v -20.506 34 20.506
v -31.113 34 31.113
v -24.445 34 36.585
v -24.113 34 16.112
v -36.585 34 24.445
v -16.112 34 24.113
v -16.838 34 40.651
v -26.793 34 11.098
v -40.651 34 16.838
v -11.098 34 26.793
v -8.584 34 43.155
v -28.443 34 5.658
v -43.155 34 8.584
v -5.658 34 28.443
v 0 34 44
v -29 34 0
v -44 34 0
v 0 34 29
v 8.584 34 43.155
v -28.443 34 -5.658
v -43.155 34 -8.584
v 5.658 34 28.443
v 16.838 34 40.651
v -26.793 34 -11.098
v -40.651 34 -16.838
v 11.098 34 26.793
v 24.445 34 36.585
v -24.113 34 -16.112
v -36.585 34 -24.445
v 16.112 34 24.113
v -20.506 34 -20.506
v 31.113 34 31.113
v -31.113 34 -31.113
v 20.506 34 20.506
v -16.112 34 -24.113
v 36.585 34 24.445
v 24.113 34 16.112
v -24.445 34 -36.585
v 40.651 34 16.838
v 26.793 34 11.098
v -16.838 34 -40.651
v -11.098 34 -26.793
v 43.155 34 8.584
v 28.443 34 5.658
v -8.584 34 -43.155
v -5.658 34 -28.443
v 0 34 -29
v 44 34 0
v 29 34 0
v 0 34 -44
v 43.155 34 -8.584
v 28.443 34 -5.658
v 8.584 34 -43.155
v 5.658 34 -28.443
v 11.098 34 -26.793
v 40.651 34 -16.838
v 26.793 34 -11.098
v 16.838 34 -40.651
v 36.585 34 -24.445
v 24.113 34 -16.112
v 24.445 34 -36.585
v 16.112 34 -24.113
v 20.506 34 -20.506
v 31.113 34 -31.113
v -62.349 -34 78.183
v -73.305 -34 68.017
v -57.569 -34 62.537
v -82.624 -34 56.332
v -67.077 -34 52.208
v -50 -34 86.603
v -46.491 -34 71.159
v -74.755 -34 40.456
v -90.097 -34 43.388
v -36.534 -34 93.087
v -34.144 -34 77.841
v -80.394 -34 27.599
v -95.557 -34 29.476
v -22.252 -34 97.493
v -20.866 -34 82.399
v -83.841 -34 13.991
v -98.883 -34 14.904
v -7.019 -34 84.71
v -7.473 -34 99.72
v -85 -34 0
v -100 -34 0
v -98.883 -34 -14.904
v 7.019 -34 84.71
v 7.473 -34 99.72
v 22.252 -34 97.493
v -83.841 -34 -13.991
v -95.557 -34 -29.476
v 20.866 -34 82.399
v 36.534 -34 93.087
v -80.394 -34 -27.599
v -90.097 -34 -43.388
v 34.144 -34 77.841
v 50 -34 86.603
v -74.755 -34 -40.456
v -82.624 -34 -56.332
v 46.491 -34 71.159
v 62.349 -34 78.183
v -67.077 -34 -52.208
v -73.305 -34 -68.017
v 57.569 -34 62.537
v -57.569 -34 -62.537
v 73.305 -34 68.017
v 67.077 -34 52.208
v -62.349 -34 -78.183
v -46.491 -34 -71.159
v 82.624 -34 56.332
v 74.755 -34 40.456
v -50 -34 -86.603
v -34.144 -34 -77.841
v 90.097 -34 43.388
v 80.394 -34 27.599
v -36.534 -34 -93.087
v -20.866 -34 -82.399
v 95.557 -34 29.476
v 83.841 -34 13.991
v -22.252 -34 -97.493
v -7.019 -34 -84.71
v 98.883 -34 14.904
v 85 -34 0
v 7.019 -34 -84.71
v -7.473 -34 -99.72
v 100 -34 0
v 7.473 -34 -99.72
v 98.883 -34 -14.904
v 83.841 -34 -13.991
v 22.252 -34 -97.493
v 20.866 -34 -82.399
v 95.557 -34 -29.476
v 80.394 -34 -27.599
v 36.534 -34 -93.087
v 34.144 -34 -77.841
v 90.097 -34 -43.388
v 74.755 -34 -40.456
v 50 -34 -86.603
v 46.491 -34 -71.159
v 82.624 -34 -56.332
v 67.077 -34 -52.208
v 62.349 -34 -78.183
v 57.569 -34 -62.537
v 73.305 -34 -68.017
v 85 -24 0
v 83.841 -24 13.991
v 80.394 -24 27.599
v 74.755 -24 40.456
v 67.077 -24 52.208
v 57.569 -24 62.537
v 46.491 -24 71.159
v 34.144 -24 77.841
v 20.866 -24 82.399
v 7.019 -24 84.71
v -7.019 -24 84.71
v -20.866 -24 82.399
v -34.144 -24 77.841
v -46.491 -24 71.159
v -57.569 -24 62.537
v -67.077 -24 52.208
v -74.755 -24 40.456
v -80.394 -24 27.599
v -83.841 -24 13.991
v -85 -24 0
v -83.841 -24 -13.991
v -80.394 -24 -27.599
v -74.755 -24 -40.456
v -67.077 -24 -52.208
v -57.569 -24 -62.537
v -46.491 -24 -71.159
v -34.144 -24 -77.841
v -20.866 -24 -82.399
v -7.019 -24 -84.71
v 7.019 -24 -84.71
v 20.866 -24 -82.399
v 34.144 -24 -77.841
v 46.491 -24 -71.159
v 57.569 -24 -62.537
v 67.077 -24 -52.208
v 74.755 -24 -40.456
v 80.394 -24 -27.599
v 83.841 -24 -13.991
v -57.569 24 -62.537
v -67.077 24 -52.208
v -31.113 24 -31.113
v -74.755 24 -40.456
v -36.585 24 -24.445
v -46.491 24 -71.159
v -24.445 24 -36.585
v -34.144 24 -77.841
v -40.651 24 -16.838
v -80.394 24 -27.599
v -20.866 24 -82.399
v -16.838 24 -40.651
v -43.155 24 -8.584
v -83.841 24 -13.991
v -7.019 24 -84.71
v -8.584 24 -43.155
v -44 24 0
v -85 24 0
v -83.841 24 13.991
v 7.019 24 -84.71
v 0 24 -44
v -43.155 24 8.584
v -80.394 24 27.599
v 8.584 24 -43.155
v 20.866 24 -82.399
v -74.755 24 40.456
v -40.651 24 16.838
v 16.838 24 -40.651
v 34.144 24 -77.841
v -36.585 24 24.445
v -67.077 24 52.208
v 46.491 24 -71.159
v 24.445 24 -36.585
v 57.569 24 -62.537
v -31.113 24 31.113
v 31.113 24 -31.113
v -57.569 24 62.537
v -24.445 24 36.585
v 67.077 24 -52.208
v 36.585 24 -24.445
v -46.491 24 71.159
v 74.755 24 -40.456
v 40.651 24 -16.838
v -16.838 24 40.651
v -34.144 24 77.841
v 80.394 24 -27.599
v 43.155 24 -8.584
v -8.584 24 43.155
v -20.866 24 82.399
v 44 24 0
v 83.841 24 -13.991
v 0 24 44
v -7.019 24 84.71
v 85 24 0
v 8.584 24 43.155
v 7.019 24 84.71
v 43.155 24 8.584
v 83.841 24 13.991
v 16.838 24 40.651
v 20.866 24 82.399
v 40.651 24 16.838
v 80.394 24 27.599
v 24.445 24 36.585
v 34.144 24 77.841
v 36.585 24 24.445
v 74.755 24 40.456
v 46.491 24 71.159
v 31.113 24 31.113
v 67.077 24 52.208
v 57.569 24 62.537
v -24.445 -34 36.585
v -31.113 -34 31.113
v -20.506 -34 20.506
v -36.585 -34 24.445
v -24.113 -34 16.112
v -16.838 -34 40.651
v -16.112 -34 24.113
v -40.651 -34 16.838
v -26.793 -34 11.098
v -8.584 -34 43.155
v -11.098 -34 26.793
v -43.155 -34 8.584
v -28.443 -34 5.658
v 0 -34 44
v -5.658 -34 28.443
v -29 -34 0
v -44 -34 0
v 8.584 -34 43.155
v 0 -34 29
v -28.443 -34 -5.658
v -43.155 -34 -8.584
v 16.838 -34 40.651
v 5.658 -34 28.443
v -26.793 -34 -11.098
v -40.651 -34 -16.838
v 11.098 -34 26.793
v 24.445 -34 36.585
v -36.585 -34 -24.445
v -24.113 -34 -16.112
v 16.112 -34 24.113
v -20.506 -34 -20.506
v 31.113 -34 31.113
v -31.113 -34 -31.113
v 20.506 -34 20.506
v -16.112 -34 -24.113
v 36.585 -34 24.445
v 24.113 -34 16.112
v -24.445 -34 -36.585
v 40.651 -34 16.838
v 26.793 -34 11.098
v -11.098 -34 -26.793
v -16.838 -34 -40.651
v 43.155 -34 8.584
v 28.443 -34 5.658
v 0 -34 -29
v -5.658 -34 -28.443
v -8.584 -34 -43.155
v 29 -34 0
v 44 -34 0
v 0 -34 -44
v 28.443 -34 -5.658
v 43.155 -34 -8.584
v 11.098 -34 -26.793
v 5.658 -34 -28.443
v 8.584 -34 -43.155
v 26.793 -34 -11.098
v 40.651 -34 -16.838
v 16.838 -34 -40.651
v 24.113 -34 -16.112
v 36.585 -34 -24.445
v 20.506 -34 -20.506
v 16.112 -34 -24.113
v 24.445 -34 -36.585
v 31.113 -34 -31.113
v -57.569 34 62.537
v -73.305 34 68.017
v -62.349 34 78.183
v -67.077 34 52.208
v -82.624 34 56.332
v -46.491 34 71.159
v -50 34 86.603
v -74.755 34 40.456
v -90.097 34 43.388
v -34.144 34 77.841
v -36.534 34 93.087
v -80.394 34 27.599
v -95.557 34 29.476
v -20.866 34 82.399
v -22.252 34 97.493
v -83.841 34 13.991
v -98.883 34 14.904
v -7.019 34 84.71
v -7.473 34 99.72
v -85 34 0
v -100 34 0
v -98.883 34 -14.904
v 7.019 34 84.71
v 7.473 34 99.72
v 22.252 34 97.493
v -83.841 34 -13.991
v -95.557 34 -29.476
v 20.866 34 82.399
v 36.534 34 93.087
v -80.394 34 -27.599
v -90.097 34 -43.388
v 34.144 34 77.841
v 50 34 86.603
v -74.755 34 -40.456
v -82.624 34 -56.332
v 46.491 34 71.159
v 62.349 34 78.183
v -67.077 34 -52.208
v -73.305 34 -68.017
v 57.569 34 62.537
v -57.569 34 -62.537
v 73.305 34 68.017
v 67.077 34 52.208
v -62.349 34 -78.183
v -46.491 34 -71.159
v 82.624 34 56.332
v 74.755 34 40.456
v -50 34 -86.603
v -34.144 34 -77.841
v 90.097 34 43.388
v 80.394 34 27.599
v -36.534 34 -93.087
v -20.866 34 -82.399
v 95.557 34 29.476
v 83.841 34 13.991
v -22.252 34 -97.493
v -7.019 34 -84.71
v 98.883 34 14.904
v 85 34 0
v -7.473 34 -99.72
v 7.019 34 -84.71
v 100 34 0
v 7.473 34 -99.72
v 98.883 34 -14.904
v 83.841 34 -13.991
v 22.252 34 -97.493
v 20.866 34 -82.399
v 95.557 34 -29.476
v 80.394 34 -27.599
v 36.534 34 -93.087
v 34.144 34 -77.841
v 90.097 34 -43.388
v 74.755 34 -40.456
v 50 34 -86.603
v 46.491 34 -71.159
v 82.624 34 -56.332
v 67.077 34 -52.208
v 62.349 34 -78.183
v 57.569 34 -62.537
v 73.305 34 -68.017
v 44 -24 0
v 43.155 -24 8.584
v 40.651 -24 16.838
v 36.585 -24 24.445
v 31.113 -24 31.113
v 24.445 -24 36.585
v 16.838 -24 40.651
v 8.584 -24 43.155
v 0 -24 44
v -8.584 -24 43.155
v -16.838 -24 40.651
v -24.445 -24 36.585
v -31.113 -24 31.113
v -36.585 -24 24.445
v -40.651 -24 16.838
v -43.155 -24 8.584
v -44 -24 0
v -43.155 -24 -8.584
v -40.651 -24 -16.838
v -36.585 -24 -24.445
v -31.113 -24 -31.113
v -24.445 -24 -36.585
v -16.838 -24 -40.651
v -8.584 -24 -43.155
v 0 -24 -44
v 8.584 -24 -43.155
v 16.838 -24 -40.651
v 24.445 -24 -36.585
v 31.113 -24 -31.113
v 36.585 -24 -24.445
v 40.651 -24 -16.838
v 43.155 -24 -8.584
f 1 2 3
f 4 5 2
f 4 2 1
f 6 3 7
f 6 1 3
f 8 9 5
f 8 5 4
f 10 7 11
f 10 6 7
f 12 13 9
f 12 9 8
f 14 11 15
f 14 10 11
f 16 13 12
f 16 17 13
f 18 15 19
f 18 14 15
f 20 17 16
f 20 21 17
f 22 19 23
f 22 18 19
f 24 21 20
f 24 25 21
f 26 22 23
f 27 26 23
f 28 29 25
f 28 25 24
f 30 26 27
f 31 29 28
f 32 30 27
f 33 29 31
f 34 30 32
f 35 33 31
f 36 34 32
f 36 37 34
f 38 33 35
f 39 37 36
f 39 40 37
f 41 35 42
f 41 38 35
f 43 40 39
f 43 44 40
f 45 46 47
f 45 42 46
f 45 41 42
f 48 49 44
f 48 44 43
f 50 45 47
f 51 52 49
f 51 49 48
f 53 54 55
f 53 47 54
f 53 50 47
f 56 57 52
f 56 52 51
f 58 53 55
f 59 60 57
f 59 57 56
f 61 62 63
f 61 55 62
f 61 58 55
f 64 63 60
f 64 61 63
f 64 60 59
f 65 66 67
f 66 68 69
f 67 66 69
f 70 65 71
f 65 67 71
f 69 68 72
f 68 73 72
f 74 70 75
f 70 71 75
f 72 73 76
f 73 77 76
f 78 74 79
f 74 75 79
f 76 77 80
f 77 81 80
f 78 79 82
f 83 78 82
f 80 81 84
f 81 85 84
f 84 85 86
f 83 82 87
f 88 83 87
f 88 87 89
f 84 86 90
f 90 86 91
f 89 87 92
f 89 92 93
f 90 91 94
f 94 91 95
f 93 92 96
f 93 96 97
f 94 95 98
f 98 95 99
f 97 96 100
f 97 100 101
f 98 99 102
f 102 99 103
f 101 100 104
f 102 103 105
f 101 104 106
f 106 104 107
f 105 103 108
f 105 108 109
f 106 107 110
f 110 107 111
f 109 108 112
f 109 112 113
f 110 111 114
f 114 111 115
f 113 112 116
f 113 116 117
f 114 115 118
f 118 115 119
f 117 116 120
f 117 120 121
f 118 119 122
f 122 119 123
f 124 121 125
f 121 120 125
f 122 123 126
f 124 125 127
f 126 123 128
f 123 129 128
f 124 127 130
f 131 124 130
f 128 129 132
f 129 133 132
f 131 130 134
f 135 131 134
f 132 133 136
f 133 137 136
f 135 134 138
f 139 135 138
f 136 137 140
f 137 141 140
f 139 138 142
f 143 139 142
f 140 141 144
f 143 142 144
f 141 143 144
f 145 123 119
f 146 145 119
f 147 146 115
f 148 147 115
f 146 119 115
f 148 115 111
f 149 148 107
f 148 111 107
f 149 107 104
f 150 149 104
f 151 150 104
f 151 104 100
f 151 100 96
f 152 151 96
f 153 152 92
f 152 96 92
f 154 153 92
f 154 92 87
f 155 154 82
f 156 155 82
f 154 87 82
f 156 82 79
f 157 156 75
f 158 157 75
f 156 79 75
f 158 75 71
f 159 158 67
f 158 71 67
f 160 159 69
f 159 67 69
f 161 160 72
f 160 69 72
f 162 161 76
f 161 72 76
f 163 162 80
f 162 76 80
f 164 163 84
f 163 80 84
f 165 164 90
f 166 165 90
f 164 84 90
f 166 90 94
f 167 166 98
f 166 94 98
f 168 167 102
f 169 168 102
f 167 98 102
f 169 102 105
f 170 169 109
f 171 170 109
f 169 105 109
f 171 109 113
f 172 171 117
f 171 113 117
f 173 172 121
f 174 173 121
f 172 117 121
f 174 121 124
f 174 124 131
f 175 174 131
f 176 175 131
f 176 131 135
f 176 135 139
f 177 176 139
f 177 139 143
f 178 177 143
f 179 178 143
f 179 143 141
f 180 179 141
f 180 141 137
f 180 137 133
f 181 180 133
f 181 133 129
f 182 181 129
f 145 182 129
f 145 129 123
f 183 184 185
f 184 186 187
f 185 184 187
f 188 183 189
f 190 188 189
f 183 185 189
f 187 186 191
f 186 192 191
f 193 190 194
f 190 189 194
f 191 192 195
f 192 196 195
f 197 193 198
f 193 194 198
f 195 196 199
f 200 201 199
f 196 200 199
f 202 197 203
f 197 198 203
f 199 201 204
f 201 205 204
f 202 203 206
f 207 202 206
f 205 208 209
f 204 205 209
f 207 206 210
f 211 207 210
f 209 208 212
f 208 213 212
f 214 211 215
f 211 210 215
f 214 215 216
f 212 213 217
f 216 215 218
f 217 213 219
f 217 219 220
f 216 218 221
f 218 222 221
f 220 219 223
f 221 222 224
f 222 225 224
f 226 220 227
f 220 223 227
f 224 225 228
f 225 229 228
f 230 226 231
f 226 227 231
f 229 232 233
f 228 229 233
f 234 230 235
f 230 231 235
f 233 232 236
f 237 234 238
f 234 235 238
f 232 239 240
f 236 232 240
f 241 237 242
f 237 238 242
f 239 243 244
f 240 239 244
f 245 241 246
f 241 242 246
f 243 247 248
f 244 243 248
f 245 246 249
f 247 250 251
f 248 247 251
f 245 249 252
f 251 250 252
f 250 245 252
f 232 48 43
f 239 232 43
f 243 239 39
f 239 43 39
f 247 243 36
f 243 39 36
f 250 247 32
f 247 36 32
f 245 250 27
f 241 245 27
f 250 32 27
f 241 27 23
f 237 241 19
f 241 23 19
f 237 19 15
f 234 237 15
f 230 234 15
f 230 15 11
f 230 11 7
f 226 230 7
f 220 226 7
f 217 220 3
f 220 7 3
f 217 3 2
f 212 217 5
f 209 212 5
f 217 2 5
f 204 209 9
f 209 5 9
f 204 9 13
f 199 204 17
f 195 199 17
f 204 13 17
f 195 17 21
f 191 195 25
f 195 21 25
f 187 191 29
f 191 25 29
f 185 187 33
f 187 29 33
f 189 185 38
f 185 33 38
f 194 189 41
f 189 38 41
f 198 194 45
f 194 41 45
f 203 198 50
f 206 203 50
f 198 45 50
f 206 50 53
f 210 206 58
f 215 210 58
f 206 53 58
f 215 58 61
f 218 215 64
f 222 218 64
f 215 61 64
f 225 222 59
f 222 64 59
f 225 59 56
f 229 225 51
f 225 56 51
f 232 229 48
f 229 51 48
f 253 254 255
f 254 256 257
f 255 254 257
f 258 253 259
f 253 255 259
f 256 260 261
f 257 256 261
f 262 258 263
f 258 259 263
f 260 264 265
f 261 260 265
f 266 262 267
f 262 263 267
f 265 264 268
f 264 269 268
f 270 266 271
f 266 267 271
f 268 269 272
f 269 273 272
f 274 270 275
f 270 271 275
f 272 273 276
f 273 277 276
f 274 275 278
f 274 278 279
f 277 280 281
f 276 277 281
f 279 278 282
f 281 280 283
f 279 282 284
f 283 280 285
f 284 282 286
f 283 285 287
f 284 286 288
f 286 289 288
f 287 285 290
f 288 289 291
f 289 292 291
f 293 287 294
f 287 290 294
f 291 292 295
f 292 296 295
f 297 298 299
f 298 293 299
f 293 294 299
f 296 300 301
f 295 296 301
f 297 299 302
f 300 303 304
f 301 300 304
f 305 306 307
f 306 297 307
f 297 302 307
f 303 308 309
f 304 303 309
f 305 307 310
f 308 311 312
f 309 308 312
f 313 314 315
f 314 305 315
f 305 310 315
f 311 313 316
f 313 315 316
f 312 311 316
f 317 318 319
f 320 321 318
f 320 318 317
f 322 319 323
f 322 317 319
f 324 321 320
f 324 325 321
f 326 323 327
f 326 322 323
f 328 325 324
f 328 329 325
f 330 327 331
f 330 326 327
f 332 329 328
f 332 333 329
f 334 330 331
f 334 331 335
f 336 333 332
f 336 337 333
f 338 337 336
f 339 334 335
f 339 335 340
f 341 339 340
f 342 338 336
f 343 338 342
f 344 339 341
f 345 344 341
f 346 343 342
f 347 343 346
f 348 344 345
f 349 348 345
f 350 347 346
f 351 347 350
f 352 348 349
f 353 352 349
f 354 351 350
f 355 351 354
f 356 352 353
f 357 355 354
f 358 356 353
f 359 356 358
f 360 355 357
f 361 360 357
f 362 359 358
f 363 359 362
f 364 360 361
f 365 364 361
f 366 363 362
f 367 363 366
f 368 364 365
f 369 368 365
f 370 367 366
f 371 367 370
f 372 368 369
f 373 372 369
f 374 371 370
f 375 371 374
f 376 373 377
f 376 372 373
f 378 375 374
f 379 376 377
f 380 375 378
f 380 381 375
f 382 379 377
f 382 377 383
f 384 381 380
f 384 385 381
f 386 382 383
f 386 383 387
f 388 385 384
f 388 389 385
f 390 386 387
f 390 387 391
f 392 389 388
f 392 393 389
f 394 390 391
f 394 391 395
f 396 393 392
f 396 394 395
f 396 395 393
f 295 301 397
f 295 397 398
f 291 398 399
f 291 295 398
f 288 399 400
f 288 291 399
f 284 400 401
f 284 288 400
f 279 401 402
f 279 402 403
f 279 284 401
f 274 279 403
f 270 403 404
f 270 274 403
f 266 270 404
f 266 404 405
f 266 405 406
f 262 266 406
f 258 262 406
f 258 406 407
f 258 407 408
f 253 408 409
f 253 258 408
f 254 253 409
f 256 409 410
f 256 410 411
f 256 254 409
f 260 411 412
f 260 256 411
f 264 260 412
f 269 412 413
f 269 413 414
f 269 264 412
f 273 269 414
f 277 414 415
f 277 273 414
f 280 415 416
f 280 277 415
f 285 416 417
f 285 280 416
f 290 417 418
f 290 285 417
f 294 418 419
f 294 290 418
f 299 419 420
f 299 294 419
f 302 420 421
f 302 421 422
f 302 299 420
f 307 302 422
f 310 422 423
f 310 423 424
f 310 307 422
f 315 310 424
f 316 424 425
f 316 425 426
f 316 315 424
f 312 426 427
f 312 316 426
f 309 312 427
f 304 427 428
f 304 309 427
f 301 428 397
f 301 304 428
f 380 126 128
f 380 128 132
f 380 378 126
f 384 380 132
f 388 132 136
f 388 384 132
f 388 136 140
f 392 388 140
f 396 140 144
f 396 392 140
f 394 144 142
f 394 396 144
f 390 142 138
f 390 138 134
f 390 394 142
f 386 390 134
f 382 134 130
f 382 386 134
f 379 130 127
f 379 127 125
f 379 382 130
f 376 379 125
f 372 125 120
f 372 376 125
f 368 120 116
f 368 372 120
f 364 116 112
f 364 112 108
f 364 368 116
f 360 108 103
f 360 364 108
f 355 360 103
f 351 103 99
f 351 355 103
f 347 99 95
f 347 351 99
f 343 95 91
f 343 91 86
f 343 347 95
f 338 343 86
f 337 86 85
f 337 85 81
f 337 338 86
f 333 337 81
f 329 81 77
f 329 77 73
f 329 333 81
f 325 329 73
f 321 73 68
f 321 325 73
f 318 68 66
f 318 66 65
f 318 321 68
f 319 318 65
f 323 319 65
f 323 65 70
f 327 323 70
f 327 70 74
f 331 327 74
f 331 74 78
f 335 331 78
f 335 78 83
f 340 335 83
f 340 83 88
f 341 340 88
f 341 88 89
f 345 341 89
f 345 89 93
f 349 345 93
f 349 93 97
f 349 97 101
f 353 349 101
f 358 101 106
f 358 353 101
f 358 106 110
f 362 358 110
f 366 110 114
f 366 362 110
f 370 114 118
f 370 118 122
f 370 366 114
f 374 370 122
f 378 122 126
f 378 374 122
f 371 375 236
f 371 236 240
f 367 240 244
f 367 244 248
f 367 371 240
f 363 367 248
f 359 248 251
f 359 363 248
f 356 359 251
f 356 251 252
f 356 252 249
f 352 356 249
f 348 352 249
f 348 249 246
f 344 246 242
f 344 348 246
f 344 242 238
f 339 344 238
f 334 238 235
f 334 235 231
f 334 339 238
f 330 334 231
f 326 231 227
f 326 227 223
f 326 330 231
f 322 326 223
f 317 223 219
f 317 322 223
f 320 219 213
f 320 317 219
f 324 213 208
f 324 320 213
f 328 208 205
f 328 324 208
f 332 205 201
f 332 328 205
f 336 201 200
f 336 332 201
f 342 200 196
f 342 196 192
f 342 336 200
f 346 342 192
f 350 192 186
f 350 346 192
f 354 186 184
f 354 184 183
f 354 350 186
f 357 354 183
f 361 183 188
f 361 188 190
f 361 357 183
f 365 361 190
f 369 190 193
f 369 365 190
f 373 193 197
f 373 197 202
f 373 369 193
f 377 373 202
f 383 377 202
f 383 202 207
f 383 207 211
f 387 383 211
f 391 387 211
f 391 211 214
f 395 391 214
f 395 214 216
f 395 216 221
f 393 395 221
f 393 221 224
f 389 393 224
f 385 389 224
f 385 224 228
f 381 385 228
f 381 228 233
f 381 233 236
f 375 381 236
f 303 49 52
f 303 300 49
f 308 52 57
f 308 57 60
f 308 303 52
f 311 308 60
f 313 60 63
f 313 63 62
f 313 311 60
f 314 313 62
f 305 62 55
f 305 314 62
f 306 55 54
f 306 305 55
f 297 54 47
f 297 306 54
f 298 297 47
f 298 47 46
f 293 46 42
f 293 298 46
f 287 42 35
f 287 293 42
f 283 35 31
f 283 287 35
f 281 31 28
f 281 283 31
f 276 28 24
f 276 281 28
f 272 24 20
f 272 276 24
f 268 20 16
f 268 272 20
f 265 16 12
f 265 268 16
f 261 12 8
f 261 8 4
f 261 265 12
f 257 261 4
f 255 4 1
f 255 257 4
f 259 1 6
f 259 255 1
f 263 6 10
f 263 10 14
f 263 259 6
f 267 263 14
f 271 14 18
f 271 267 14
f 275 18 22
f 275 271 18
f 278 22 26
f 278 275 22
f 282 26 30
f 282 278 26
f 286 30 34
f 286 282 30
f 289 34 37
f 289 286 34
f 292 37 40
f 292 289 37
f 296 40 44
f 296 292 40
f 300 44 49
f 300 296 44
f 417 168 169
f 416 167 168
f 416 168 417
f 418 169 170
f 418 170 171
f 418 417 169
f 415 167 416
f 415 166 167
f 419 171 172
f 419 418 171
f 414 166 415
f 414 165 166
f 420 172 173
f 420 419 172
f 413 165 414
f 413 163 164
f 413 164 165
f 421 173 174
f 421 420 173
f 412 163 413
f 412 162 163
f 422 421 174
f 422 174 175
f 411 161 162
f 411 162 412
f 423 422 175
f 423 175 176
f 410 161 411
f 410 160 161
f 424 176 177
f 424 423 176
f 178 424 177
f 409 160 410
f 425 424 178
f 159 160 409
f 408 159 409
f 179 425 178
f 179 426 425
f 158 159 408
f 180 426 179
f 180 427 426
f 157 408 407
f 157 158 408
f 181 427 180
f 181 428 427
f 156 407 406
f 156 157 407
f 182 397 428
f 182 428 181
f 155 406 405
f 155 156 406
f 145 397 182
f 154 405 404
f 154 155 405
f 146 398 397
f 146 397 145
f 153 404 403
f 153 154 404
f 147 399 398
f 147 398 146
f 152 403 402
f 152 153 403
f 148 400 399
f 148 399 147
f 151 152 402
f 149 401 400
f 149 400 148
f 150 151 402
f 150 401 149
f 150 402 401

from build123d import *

# Parameters (mm, degrees)
SKETCH_1_R          = 100
SKETCH_1_R_2        = 29
EXTRUDE_1_DEPTH     = 34
SKETCH_2_R          = 85
SKETCH_2_R_2        = 44
CUT_EXTRUDE_1_DEPTH = 10


with BuildPart() as part:
    # 草图1 → 凸台-拉伸1 (new body, symmetric)
    with BuildSketch(Plane(origin=(0, 0, 0), x_dir=(1, 0, 0), z_dir=(0, 1, 0))):
        Circle(SKETCH_1_R)
        Circle(SKETCH_1_R_2, mode=Mode.SUBTRACT)
    extrude(amount=EXTRUDE_1_DEPTH, both=True)

    # 草图2 → 切除-拉伸1 (cut)
    with BuildSketch(Plane.XZ.offset(34)):
        Circle(SKETCH_2_R)
        Circle(SKETCH_2_R_2, mode=Mode.SUBTRACT)
    cut_extrude_1 = extrude(amount=-CUT_EXTRUDE_1_DEPTH, mode=Mode.SUBTRACT)

    # 镜向1: 切除-拉伸1 across plane
    add(cut_extrude_1.mirror(Plane.ZX), mode=Mode.SUBTRACT)


solid = part.part
